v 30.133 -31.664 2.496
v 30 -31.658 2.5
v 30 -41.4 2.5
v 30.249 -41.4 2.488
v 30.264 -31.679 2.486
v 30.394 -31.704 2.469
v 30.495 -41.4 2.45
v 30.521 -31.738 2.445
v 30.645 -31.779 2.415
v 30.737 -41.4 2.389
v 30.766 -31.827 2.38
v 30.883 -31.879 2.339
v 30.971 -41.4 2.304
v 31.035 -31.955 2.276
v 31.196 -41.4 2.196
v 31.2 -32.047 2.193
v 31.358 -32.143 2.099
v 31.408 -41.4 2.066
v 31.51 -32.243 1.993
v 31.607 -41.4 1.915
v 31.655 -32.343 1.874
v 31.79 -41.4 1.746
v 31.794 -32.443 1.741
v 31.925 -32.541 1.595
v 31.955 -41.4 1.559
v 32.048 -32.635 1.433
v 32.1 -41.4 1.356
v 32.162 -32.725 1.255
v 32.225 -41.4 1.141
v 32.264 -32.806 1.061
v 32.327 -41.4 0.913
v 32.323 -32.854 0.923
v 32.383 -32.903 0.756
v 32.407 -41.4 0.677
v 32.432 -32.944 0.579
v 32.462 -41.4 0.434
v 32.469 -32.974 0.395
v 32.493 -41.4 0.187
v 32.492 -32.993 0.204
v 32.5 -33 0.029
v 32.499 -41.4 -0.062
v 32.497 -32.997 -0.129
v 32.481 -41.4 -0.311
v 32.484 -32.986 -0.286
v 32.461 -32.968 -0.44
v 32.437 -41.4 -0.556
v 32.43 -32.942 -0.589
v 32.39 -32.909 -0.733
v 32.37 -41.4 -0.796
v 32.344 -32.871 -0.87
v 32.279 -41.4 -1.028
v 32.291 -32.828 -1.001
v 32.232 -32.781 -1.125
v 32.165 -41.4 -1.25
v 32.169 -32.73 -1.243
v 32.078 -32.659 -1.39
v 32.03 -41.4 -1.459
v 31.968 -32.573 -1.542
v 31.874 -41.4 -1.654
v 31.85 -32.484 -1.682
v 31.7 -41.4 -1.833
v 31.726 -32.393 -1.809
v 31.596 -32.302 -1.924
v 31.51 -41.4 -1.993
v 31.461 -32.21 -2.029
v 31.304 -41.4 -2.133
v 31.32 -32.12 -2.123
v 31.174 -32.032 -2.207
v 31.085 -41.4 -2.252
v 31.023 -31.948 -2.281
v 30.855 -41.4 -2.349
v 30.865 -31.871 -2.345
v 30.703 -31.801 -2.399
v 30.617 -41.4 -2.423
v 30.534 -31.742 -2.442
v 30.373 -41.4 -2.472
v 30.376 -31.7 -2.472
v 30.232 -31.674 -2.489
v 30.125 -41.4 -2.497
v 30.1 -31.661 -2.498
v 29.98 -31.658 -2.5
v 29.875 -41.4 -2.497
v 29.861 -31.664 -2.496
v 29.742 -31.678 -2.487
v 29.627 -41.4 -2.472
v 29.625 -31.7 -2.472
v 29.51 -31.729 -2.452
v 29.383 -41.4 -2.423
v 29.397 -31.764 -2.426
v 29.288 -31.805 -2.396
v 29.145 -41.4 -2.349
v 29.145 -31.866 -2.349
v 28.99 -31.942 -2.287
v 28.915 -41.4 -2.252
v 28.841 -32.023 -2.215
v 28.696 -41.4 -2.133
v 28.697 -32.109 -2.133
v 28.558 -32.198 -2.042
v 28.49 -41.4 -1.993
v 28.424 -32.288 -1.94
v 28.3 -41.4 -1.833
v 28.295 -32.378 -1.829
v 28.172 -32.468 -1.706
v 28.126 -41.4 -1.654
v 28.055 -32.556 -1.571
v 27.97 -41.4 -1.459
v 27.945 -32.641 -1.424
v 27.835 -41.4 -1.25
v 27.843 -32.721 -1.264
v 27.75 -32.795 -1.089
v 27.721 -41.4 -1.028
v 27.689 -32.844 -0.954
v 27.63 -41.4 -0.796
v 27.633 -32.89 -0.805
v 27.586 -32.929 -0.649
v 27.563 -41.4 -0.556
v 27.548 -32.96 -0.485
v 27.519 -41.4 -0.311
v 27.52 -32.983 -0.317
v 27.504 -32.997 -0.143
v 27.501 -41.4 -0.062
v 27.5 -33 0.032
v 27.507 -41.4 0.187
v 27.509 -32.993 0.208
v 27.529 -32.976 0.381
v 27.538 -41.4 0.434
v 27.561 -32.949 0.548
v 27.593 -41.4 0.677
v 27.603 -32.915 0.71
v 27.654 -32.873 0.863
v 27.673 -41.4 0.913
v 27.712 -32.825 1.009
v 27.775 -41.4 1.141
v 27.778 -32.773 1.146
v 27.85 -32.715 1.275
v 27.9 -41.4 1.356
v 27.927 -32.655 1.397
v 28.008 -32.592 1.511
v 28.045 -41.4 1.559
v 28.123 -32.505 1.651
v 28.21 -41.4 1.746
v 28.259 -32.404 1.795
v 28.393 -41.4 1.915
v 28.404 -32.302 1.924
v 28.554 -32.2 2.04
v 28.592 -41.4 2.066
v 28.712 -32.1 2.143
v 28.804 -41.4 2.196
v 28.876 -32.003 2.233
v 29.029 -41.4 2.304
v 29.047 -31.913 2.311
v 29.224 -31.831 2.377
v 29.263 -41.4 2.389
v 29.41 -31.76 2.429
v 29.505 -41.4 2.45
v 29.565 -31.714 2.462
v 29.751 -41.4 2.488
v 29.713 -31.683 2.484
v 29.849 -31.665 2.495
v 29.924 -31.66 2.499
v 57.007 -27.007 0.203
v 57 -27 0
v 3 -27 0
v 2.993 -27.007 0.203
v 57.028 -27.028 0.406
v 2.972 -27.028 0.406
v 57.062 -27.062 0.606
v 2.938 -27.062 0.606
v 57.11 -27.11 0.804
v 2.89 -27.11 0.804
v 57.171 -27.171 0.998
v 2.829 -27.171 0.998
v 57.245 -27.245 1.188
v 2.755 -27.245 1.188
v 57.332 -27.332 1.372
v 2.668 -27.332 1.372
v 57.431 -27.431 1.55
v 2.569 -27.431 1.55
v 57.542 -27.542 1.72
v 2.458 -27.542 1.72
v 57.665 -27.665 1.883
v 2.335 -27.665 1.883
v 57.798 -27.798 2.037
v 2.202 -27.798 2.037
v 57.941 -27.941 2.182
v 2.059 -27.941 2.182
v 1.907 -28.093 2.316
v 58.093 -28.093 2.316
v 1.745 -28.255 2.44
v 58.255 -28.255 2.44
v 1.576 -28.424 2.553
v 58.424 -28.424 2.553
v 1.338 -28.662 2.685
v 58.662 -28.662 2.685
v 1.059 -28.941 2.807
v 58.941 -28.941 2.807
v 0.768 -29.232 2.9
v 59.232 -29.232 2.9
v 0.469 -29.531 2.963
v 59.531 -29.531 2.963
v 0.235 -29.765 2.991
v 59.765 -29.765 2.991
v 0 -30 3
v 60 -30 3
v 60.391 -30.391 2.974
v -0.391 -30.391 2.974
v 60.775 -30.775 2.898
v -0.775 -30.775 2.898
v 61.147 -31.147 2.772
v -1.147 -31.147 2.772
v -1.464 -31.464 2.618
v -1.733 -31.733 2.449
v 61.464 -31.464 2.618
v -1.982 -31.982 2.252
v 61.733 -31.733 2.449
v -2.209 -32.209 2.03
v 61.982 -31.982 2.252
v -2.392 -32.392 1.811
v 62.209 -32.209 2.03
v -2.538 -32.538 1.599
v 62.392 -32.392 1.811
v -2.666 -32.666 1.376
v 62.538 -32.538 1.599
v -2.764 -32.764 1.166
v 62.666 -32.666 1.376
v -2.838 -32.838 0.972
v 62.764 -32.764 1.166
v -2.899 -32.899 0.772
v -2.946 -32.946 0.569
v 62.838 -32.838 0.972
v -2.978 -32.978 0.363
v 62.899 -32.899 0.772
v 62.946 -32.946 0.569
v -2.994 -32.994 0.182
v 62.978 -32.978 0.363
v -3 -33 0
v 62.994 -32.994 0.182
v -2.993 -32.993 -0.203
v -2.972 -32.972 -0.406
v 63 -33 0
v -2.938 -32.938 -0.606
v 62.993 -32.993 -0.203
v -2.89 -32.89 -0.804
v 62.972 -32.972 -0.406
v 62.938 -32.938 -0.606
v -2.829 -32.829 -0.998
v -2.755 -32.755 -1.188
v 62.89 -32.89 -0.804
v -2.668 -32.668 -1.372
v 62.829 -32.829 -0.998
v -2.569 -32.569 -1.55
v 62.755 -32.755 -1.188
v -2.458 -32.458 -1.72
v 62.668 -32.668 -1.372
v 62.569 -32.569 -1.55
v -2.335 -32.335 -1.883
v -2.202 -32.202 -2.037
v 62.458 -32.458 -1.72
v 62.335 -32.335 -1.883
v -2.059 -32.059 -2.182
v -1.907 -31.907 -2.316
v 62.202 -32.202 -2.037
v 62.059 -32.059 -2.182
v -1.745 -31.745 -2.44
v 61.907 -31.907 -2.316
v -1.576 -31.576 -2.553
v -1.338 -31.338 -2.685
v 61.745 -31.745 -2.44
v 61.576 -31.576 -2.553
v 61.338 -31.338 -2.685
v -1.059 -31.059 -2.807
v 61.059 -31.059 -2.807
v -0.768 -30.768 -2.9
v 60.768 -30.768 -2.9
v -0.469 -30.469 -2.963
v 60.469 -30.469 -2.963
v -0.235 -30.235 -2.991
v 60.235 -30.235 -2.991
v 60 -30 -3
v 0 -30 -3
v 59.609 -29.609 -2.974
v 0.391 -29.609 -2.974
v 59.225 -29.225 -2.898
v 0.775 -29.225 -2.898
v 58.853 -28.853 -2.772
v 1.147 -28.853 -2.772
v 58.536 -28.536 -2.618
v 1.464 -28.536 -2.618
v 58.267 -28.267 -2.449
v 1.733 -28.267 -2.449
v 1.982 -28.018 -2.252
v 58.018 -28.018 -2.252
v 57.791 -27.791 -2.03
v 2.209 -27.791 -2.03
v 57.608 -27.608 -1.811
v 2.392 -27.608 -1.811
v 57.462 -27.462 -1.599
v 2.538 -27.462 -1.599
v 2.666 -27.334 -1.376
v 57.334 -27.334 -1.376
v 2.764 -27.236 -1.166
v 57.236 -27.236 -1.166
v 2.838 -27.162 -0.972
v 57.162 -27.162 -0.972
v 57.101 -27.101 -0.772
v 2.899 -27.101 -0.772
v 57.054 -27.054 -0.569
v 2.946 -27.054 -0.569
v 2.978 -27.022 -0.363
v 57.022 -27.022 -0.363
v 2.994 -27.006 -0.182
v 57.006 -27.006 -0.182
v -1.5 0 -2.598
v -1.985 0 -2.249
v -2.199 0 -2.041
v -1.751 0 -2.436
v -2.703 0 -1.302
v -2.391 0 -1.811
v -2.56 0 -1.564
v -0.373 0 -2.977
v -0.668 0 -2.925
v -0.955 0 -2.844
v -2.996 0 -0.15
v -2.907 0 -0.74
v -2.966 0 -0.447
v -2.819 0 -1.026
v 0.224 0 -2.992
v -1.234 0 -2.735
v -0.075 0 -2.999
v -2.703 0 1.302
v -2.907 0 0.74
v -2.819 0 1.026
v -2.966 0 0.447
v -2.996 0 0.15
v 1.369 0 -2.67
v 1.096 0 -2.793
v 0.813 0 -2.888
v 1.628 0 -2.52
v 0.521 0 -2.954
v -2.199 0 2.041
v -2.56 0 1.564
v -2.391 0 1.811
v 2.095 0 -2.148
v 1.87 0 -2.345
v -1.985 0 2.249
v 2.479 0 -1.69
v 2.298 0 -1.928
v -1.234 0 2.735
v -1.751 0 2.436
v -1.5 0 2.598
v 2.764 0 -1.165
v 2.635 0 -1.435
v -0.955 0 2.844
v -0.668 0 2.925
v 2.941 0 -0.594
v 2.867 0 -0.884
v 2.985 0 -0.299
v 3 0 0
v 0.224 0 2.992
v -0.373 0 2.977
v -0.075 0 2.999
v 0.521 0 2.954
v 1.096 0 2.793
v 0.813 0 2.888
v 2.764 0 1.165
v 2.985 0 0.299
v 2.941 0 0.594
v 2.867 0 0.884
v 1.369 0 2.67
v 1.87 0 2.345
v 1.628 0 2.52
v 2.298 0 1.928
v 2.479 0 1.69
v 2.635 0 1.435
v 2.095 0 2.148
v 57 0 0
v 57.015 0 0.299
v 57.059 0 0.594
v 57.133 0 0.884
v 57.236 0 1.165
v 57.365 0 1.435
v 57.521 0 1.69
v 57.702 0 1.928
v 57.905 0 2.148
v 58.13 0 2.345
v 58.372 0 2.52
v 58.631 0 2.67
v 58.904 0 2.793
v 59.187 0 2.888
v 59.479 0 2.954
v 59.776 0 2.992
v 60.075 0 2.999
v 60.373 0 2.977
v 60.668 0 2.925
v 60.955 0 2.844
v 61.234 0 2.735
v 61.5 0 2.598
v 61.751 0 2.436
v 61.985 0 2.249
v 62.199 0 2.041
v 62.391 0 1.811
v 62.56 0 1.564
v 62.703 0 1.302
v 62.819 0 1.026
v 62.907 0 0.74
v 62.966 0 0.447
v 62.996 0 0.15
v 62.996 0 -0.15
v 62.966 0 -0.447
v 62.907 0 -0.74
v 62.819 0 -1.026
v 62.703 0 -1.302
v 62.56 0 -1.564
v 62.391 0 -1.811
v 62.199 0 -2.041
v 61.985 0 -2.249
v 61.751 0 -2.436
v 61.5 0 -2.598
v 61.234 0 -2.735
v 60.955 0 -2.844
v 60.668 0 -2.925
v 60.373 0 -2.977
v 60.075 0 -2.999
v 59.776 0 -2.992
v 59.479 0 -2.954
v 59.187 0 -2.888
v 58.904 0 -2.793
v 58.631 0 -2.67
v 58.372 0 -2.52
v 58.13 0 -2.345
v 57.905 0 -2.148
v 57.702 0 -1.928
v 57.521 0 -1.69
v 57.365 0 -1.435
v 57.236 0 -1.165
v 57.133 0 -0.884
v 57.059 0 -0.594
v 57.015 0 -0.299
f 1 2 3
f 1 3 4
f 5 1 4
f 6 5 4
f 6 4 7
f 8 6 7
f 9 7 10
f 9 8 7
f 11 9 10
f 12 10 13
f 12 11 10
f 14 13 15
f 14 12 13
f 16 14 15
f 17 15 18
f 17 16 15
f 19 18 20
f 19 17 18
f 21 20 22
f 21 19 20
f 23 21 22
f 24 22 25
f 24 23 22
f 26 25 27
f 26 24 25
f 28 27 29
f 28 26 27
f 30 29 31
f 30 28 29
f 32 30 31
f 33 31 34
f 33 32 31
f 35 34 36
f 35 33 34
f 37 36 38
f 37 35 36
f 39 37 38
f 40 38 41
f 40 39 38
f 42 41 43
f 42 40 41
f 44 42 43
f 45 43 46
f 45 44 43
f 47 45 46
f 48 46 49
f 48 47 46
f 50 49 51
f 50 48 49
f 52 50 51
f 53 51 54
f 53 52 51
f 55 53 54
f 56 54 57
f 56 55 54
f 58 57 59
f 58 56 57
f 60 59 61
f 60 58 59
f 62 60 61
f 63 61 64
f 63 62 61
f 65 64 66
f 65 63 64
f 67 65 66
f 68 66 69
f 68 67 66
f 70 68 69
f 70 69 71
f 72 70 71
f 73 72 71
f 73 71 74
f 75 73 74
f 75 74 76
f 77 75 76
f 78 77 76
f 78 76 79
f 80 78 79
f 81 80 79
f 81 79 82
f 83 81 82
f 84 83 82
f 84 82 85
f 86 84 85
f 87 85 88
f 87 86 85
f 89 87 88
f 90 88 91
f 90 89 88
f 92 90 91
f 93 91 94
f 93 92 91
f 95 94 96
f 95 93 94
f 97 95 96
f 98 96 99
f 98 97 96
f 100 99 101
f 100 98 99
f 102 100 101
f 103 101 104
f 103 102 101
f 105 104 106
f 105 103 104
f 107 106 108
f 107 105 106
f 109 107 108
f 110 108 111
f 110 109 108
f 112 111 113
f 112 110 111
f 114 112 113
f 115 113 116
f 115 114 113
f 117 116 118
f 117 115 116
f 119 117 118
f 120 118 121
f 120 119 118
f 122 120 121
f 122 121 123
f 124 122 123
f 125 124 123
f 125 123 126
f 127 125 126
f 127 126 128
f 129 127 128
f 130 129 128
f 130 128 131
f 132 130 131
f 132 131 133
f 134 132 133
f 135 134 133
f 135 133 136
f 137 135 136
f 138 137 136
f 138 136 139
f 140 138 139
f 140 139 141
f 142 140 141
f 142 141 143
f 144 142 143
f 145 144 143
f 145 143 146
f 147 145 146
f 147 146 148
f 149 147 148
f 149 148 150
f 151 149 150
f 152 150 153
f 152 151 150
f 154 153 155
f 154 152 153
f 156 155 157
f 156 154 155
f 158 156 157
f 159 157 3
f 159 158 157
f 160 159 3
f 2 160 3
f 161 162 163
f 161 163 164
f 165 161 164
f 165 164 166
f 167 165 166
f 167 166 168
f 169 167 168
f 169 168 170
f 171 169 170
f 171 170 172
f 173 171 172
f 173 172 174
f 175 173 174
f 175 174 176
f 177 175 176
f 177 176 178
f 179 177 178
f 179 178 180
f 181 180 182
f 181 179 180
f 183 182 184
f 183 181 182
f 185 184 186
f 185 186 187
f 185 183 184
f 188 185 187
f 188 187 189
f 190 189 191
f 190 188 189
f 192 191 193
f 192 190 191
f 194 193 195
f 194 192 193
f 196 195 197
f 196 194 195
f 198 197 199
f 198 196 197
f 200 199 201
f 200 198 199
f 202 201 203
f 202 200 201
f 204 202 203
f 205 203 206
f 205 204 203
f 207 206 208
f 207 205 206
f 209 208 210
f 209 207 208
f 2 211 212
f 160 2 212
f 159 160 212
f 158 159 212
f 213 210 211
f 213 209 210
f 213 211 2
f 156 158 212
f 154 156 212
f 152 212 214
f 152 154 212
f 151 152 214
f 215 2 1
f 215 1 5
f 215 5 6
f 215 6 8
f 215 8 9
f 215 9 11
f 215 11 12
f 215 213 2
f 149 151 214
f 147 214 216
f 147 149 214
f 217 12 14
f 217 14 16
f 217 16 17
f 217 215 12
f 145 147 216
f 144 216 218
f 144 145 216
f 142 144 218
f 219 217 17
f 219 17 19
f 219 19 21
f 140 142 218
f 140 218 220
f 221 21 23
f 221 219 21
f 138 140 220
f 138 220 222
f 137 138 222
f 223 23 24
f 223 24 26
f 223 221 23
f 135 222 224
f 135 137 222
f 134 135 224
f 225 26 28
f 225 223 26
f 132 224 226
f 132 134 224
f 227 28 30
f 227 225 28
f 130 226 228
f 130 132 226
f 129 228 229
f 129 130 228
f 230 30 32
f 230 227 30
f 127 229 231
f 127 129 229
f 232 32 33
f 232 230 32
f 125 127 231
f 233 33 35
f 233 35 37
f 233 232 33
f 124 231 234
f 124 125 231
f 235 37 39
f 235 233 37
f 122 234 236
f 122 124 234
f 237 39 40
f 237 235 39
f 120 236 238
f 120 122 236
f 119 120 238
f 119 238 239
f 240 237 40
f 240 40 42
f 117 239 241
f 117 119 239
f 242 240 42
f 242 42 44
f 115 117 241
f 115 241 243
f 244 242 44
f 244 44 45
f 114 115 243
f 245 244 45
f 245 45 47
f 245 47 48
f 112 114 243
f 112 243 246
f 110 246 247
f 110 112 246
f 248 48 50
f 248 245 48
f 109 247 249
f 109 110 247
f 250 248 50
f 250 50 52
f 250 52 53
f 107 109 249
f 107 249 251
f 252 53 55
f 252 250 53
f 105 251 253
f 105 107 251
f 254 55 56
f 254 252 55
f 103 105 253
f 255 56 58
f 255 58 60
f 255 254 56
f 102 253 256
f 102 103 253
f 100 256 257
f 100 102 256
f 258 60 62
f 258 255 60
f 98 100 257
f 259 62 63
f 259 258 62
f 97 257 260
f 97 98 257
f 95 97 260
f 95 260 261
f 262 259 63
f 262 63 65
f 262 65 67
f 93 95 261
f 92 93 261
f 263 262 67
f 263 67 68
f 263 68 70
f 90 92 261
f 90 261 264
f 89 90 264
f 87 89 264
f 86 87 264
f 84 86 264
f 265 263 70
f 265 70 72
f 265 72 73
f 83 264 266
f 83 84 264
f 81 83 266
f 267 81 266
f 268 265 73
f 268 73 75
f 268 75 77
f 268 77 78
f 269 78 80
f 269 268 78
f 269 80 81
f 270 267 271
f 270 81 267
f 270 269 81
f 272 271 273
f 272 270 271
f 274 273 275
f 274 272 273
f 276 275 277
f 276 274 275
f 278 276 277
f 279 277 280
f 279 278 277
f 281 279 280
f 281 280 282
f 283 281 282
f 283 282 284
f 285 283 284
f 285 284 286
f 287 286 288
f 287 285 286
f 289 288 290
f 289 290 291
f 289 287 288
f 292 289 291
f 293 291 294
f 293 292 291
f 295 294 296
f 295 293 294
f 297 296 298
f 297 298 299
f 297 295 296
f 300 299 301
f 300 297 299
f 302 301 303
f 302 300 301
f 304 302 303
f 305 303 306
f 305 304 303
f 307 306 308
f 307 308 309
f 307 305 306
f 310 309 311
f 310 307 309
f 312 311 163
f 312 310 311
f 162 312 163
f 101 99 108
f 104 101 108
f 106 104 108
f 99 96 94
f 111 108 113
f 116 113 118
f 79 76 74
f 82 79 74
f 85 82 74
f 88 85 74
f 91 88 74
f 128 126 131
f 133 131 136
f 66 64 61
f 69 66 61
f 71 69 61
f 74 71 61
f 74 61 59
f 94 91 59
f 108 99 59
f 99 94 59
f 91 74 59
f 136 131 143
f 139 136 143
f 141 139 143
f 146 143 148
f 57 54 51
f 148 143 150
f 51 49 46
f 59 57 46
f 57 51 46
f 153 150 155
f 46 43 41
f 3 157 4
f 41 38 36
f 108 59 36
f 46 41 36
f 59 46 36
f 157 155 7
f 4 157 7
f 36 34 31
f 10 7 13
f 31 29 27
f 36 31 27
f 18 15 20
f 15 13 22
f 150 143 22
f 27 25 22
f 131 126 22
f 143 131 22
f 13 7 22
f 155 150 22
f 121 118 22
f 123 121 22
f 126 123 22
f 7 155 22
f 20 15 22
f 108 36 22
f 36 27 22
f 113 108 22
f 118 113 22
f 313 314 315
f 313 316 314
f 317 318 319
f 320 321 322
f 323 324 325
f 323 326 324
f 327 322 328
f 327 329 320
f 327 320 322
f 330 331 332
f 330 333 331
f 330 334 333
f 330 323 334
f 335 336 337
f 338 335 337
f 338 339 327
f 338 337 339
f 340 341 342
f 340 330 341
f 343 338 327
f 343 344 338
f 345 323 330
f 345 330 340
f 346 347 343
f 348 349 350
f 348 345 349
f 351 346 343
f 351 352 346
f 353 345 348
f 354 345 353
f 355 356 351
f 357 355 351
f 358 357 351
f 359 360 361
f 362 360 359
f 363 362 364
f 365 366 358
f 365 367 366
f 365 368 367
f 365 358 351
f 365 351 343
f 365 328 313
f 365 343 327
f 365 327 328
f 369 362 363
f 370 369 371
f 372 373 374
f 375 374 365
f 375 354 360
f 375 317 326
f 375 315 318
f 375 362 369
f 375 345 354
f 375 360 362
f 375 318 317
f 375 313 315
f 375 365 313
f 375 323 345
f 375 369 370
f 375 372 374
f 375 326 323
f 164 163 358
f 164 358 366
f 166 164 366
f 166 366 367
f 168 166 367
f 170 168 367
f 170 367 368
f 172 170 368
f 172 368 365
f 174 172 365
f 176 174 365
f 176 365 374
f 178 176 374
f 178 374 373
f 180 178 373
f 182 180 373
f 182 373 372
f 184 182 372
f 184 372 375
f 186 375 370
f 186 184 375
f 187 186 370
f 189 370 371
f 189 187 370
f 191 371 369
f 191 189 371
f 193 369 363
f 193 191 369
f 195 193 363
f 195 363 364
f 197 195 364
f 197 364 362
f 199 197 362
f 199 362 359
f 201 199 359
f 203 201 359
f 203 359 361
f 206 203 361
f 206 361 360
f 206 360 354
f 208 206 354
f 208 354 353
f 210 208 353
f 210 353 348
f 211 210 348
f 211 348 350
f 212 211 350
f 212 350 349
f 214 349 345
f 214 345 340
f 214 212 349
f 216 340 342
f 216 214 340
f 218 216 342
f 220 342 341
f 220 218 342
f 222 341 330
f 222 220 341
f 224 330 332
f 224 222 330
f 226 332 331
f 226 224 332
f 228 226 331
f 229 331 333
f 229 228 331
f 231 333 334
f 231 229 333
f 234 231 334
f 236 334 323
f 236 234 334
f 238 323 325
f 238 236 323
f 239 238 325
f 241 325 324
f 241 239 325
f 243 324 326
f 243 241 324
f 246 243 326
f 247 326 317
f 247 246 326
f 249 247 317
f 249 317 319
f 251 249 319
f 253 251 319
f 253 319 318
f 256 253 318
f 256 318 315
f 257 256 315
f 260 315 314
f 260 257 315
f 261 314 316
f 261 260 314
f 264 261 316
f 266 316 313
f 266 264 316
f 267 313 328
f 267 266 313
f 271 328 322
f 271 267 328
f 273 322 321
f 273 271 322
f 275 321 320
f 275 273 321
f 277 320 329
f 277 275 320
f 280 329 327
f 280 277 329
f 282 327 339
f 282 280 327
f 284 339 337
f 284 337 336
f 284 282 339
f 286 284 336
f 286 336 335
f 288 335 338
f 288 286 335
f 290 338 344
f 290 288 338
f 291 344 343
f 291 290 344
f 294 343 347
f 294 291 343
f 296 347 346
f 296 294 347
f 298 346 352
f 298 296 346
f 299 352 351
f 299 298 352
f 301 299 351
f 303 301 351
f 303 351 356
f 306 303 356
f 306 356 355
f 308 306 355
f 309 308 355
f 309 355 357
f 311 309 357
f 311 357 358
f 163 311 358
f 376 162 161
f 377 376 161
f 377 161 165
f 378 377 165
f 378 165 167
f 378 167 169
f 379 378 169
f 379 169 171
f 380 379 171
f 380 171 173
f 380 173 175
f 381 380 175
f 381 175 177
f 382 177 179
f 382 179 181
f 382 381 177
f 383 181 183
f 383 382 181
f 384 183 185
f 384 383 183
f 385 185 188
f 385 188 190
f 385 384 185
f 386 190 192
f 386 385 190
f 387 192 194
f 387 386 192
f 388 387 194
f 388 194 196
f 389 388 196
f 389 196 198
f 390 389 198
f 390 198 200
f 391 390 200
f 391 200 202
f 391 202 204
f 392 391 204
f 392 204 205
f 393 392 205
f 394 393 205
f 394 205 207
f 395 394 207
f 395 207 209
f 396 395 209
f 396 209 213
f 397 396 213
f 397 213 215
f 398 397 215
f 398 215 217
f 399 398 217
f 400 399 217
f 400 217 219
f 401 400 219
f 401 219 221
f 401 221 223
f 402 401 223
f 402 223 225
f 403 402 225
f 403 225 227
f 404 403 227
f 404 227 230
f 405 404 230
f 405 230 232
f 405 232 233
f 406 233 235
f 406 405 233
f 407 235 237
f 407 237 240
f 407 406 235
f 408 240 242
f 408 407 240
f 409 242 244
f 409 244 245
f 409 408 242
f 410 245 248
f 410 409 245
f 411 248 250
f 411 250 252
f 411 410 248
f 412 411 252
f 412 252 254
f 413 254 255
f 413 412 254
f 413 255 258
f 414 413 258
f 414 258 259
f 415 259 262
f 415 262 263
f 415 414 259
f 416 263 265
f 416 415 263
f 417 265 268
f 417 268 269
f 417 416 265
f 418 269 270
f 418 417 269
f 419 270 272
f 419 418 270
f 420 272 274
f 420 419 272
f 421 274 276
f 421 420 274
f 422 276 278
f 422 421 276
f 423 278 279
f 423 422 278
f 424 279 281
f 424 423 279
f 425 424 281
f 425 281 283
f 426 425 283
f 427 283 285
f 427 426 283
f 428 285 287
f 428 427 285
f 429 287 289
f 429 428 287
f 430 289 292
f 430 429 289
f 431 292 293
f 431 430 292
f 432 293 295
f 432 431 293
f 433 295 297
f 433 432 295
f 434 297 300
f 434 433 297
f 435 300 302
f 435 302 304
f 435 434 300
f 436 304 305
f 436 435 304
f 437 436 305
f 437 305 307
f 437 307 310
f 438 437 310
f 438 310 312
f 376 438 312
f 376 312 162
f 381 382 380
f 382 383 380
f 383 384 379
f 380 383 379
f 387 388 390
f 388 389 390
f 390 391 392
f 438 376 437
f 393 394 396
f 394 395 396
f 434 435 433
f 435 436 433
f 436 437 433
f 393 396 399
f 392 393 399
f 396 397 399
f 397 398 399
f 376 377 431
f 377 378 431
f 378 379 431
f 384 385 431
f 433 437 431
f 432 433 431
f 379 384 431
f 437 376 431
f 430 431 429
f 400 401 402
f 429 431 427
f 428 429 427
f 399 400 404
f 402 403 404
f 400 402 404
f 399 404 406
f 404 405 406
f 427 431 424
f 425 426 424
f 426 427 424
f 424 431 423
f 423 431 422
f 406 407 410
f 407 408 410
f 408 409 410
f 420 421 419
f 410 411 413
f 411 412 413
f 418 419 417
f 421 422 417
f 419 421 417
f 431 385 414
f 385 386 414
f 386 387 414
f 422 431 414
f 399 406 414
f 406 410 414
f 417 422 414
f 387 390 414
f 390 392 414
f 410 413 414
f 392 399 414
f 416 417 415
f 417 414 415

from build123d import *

# Parameters (mm, degrees)
SKETCH_1_R      = 3
SKETCH_4_R      = 2.5
EXTRUDE_1_DEPTH = 11.25


with BuildPart() as part:
    # 扫描1: sweep along a path in 草图2
    with BuildLine(Plane.XY) as sweep_1_path:
        Line((0, 0), (0, -30))
        Line((0, -30), (60, -30))
        Line((60, -30), (60, 0))
    # 草图1 → 扫描1 (sweep)
    with BuildSketch(Plane(origin=(0, 0, 0), x_dir=(1, 0, 0), z_dir=(0, 1, 0))):
        Circle(SKETCH_1_R)
    sweep(path=sweep_1_path.line, transition=Transition.RIGHT)

    # 草图4 → 凸台-拉伸1 (add)
    with BuildSketch(Plane(origin=(30, -30.150206029, 1.8381e-05), x_dir=(1, 0, 0), z_dir=(0, 1, 0))):
        Circle(SKETCH_4_R)
    extrude(amount=-EXTRUDE_1_DEPTH)


solid = part.part
